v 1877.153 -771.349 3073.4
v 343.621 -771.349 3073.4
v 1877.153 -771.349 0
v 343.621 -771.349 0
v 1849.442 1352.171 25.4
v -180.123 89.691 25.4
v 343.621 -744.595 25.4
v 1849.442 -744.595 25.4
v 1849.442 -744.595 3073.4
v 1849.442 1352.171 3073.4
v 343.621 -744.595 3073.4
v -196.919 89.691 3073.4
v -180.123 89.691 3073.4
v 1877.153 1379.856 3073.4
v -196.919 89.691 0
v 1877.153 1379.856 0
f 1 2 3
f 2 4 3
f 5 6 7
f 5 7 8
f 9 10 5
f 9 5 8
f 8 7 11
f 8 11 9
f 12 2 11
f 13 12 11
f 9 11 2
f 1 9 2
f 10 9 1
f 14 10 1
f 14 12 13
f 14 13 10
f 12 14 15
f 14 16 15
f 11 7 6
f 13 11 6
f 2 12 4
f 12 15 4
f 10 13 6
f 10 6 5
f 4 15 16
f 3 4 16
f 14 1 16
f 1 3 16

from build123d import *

# Parameters (mm, degrees)
F1_DEPTH = 25.4
F2_W     = 1533.531874
F2_H     = 26.754558
F3_DEPTH = 3048
F5_DEPTH = 3048
F7_DEPTH = 3048
F9_DEPTH = 3048


with BuildPart() as f1:
    # F0 (on Top) → F1 (new body)
    with BuildSketch(Plane.XY):
        Polygon((1877.152562, 1379.855514), (-196.919069, 89.690931), (343.620688, -771.349192), (1877.152562, -771.349192), align=None)
    extrude(amount=F1_DEPTH)

    # F2 (on face) → F3 (join)
    with BuildSketch(Plane.XY.offset(25.4)):
        with Locations((1110.386625, -757.971913)):
            Rectangle(F2_W, F2_H)
    extrude(amount=F3_DEPTH)

    # F4 (on face) → F5 (join)
    with BuildSketch(Plane.XY.offset(25.4)):
        Polygon((-180.123217, 89.690931), (-196.919069, 89.690931), (343.620688, -771.349192), (343.620688, -744.594634), align=None)
    extrude(amount=F5_DEPTH)

    # F6 (on face) → F7 (join)
    with BuildSketch(Plane.XY.offset(25.4)):
        Polygon((1877.152562, 1369.407748), (1877.152562, 1379.855514), (-196.919069, 89.690931), (-180.123217, 89.690931), align=None)
    extrude(amount=F7_DEPTH)

    # F8 (on face) → F9 (join)
    with BuildSketch(Plane.XY.offset(25.4)):
        Polygon((1877.152562, -744.594634), (1877.152562, 1369.407748), (1849.442244, 1352.170701), (1849.442244, -744.594634), align=None)
    extrude(amount=F9_DEPTH)


solid = f1.part
